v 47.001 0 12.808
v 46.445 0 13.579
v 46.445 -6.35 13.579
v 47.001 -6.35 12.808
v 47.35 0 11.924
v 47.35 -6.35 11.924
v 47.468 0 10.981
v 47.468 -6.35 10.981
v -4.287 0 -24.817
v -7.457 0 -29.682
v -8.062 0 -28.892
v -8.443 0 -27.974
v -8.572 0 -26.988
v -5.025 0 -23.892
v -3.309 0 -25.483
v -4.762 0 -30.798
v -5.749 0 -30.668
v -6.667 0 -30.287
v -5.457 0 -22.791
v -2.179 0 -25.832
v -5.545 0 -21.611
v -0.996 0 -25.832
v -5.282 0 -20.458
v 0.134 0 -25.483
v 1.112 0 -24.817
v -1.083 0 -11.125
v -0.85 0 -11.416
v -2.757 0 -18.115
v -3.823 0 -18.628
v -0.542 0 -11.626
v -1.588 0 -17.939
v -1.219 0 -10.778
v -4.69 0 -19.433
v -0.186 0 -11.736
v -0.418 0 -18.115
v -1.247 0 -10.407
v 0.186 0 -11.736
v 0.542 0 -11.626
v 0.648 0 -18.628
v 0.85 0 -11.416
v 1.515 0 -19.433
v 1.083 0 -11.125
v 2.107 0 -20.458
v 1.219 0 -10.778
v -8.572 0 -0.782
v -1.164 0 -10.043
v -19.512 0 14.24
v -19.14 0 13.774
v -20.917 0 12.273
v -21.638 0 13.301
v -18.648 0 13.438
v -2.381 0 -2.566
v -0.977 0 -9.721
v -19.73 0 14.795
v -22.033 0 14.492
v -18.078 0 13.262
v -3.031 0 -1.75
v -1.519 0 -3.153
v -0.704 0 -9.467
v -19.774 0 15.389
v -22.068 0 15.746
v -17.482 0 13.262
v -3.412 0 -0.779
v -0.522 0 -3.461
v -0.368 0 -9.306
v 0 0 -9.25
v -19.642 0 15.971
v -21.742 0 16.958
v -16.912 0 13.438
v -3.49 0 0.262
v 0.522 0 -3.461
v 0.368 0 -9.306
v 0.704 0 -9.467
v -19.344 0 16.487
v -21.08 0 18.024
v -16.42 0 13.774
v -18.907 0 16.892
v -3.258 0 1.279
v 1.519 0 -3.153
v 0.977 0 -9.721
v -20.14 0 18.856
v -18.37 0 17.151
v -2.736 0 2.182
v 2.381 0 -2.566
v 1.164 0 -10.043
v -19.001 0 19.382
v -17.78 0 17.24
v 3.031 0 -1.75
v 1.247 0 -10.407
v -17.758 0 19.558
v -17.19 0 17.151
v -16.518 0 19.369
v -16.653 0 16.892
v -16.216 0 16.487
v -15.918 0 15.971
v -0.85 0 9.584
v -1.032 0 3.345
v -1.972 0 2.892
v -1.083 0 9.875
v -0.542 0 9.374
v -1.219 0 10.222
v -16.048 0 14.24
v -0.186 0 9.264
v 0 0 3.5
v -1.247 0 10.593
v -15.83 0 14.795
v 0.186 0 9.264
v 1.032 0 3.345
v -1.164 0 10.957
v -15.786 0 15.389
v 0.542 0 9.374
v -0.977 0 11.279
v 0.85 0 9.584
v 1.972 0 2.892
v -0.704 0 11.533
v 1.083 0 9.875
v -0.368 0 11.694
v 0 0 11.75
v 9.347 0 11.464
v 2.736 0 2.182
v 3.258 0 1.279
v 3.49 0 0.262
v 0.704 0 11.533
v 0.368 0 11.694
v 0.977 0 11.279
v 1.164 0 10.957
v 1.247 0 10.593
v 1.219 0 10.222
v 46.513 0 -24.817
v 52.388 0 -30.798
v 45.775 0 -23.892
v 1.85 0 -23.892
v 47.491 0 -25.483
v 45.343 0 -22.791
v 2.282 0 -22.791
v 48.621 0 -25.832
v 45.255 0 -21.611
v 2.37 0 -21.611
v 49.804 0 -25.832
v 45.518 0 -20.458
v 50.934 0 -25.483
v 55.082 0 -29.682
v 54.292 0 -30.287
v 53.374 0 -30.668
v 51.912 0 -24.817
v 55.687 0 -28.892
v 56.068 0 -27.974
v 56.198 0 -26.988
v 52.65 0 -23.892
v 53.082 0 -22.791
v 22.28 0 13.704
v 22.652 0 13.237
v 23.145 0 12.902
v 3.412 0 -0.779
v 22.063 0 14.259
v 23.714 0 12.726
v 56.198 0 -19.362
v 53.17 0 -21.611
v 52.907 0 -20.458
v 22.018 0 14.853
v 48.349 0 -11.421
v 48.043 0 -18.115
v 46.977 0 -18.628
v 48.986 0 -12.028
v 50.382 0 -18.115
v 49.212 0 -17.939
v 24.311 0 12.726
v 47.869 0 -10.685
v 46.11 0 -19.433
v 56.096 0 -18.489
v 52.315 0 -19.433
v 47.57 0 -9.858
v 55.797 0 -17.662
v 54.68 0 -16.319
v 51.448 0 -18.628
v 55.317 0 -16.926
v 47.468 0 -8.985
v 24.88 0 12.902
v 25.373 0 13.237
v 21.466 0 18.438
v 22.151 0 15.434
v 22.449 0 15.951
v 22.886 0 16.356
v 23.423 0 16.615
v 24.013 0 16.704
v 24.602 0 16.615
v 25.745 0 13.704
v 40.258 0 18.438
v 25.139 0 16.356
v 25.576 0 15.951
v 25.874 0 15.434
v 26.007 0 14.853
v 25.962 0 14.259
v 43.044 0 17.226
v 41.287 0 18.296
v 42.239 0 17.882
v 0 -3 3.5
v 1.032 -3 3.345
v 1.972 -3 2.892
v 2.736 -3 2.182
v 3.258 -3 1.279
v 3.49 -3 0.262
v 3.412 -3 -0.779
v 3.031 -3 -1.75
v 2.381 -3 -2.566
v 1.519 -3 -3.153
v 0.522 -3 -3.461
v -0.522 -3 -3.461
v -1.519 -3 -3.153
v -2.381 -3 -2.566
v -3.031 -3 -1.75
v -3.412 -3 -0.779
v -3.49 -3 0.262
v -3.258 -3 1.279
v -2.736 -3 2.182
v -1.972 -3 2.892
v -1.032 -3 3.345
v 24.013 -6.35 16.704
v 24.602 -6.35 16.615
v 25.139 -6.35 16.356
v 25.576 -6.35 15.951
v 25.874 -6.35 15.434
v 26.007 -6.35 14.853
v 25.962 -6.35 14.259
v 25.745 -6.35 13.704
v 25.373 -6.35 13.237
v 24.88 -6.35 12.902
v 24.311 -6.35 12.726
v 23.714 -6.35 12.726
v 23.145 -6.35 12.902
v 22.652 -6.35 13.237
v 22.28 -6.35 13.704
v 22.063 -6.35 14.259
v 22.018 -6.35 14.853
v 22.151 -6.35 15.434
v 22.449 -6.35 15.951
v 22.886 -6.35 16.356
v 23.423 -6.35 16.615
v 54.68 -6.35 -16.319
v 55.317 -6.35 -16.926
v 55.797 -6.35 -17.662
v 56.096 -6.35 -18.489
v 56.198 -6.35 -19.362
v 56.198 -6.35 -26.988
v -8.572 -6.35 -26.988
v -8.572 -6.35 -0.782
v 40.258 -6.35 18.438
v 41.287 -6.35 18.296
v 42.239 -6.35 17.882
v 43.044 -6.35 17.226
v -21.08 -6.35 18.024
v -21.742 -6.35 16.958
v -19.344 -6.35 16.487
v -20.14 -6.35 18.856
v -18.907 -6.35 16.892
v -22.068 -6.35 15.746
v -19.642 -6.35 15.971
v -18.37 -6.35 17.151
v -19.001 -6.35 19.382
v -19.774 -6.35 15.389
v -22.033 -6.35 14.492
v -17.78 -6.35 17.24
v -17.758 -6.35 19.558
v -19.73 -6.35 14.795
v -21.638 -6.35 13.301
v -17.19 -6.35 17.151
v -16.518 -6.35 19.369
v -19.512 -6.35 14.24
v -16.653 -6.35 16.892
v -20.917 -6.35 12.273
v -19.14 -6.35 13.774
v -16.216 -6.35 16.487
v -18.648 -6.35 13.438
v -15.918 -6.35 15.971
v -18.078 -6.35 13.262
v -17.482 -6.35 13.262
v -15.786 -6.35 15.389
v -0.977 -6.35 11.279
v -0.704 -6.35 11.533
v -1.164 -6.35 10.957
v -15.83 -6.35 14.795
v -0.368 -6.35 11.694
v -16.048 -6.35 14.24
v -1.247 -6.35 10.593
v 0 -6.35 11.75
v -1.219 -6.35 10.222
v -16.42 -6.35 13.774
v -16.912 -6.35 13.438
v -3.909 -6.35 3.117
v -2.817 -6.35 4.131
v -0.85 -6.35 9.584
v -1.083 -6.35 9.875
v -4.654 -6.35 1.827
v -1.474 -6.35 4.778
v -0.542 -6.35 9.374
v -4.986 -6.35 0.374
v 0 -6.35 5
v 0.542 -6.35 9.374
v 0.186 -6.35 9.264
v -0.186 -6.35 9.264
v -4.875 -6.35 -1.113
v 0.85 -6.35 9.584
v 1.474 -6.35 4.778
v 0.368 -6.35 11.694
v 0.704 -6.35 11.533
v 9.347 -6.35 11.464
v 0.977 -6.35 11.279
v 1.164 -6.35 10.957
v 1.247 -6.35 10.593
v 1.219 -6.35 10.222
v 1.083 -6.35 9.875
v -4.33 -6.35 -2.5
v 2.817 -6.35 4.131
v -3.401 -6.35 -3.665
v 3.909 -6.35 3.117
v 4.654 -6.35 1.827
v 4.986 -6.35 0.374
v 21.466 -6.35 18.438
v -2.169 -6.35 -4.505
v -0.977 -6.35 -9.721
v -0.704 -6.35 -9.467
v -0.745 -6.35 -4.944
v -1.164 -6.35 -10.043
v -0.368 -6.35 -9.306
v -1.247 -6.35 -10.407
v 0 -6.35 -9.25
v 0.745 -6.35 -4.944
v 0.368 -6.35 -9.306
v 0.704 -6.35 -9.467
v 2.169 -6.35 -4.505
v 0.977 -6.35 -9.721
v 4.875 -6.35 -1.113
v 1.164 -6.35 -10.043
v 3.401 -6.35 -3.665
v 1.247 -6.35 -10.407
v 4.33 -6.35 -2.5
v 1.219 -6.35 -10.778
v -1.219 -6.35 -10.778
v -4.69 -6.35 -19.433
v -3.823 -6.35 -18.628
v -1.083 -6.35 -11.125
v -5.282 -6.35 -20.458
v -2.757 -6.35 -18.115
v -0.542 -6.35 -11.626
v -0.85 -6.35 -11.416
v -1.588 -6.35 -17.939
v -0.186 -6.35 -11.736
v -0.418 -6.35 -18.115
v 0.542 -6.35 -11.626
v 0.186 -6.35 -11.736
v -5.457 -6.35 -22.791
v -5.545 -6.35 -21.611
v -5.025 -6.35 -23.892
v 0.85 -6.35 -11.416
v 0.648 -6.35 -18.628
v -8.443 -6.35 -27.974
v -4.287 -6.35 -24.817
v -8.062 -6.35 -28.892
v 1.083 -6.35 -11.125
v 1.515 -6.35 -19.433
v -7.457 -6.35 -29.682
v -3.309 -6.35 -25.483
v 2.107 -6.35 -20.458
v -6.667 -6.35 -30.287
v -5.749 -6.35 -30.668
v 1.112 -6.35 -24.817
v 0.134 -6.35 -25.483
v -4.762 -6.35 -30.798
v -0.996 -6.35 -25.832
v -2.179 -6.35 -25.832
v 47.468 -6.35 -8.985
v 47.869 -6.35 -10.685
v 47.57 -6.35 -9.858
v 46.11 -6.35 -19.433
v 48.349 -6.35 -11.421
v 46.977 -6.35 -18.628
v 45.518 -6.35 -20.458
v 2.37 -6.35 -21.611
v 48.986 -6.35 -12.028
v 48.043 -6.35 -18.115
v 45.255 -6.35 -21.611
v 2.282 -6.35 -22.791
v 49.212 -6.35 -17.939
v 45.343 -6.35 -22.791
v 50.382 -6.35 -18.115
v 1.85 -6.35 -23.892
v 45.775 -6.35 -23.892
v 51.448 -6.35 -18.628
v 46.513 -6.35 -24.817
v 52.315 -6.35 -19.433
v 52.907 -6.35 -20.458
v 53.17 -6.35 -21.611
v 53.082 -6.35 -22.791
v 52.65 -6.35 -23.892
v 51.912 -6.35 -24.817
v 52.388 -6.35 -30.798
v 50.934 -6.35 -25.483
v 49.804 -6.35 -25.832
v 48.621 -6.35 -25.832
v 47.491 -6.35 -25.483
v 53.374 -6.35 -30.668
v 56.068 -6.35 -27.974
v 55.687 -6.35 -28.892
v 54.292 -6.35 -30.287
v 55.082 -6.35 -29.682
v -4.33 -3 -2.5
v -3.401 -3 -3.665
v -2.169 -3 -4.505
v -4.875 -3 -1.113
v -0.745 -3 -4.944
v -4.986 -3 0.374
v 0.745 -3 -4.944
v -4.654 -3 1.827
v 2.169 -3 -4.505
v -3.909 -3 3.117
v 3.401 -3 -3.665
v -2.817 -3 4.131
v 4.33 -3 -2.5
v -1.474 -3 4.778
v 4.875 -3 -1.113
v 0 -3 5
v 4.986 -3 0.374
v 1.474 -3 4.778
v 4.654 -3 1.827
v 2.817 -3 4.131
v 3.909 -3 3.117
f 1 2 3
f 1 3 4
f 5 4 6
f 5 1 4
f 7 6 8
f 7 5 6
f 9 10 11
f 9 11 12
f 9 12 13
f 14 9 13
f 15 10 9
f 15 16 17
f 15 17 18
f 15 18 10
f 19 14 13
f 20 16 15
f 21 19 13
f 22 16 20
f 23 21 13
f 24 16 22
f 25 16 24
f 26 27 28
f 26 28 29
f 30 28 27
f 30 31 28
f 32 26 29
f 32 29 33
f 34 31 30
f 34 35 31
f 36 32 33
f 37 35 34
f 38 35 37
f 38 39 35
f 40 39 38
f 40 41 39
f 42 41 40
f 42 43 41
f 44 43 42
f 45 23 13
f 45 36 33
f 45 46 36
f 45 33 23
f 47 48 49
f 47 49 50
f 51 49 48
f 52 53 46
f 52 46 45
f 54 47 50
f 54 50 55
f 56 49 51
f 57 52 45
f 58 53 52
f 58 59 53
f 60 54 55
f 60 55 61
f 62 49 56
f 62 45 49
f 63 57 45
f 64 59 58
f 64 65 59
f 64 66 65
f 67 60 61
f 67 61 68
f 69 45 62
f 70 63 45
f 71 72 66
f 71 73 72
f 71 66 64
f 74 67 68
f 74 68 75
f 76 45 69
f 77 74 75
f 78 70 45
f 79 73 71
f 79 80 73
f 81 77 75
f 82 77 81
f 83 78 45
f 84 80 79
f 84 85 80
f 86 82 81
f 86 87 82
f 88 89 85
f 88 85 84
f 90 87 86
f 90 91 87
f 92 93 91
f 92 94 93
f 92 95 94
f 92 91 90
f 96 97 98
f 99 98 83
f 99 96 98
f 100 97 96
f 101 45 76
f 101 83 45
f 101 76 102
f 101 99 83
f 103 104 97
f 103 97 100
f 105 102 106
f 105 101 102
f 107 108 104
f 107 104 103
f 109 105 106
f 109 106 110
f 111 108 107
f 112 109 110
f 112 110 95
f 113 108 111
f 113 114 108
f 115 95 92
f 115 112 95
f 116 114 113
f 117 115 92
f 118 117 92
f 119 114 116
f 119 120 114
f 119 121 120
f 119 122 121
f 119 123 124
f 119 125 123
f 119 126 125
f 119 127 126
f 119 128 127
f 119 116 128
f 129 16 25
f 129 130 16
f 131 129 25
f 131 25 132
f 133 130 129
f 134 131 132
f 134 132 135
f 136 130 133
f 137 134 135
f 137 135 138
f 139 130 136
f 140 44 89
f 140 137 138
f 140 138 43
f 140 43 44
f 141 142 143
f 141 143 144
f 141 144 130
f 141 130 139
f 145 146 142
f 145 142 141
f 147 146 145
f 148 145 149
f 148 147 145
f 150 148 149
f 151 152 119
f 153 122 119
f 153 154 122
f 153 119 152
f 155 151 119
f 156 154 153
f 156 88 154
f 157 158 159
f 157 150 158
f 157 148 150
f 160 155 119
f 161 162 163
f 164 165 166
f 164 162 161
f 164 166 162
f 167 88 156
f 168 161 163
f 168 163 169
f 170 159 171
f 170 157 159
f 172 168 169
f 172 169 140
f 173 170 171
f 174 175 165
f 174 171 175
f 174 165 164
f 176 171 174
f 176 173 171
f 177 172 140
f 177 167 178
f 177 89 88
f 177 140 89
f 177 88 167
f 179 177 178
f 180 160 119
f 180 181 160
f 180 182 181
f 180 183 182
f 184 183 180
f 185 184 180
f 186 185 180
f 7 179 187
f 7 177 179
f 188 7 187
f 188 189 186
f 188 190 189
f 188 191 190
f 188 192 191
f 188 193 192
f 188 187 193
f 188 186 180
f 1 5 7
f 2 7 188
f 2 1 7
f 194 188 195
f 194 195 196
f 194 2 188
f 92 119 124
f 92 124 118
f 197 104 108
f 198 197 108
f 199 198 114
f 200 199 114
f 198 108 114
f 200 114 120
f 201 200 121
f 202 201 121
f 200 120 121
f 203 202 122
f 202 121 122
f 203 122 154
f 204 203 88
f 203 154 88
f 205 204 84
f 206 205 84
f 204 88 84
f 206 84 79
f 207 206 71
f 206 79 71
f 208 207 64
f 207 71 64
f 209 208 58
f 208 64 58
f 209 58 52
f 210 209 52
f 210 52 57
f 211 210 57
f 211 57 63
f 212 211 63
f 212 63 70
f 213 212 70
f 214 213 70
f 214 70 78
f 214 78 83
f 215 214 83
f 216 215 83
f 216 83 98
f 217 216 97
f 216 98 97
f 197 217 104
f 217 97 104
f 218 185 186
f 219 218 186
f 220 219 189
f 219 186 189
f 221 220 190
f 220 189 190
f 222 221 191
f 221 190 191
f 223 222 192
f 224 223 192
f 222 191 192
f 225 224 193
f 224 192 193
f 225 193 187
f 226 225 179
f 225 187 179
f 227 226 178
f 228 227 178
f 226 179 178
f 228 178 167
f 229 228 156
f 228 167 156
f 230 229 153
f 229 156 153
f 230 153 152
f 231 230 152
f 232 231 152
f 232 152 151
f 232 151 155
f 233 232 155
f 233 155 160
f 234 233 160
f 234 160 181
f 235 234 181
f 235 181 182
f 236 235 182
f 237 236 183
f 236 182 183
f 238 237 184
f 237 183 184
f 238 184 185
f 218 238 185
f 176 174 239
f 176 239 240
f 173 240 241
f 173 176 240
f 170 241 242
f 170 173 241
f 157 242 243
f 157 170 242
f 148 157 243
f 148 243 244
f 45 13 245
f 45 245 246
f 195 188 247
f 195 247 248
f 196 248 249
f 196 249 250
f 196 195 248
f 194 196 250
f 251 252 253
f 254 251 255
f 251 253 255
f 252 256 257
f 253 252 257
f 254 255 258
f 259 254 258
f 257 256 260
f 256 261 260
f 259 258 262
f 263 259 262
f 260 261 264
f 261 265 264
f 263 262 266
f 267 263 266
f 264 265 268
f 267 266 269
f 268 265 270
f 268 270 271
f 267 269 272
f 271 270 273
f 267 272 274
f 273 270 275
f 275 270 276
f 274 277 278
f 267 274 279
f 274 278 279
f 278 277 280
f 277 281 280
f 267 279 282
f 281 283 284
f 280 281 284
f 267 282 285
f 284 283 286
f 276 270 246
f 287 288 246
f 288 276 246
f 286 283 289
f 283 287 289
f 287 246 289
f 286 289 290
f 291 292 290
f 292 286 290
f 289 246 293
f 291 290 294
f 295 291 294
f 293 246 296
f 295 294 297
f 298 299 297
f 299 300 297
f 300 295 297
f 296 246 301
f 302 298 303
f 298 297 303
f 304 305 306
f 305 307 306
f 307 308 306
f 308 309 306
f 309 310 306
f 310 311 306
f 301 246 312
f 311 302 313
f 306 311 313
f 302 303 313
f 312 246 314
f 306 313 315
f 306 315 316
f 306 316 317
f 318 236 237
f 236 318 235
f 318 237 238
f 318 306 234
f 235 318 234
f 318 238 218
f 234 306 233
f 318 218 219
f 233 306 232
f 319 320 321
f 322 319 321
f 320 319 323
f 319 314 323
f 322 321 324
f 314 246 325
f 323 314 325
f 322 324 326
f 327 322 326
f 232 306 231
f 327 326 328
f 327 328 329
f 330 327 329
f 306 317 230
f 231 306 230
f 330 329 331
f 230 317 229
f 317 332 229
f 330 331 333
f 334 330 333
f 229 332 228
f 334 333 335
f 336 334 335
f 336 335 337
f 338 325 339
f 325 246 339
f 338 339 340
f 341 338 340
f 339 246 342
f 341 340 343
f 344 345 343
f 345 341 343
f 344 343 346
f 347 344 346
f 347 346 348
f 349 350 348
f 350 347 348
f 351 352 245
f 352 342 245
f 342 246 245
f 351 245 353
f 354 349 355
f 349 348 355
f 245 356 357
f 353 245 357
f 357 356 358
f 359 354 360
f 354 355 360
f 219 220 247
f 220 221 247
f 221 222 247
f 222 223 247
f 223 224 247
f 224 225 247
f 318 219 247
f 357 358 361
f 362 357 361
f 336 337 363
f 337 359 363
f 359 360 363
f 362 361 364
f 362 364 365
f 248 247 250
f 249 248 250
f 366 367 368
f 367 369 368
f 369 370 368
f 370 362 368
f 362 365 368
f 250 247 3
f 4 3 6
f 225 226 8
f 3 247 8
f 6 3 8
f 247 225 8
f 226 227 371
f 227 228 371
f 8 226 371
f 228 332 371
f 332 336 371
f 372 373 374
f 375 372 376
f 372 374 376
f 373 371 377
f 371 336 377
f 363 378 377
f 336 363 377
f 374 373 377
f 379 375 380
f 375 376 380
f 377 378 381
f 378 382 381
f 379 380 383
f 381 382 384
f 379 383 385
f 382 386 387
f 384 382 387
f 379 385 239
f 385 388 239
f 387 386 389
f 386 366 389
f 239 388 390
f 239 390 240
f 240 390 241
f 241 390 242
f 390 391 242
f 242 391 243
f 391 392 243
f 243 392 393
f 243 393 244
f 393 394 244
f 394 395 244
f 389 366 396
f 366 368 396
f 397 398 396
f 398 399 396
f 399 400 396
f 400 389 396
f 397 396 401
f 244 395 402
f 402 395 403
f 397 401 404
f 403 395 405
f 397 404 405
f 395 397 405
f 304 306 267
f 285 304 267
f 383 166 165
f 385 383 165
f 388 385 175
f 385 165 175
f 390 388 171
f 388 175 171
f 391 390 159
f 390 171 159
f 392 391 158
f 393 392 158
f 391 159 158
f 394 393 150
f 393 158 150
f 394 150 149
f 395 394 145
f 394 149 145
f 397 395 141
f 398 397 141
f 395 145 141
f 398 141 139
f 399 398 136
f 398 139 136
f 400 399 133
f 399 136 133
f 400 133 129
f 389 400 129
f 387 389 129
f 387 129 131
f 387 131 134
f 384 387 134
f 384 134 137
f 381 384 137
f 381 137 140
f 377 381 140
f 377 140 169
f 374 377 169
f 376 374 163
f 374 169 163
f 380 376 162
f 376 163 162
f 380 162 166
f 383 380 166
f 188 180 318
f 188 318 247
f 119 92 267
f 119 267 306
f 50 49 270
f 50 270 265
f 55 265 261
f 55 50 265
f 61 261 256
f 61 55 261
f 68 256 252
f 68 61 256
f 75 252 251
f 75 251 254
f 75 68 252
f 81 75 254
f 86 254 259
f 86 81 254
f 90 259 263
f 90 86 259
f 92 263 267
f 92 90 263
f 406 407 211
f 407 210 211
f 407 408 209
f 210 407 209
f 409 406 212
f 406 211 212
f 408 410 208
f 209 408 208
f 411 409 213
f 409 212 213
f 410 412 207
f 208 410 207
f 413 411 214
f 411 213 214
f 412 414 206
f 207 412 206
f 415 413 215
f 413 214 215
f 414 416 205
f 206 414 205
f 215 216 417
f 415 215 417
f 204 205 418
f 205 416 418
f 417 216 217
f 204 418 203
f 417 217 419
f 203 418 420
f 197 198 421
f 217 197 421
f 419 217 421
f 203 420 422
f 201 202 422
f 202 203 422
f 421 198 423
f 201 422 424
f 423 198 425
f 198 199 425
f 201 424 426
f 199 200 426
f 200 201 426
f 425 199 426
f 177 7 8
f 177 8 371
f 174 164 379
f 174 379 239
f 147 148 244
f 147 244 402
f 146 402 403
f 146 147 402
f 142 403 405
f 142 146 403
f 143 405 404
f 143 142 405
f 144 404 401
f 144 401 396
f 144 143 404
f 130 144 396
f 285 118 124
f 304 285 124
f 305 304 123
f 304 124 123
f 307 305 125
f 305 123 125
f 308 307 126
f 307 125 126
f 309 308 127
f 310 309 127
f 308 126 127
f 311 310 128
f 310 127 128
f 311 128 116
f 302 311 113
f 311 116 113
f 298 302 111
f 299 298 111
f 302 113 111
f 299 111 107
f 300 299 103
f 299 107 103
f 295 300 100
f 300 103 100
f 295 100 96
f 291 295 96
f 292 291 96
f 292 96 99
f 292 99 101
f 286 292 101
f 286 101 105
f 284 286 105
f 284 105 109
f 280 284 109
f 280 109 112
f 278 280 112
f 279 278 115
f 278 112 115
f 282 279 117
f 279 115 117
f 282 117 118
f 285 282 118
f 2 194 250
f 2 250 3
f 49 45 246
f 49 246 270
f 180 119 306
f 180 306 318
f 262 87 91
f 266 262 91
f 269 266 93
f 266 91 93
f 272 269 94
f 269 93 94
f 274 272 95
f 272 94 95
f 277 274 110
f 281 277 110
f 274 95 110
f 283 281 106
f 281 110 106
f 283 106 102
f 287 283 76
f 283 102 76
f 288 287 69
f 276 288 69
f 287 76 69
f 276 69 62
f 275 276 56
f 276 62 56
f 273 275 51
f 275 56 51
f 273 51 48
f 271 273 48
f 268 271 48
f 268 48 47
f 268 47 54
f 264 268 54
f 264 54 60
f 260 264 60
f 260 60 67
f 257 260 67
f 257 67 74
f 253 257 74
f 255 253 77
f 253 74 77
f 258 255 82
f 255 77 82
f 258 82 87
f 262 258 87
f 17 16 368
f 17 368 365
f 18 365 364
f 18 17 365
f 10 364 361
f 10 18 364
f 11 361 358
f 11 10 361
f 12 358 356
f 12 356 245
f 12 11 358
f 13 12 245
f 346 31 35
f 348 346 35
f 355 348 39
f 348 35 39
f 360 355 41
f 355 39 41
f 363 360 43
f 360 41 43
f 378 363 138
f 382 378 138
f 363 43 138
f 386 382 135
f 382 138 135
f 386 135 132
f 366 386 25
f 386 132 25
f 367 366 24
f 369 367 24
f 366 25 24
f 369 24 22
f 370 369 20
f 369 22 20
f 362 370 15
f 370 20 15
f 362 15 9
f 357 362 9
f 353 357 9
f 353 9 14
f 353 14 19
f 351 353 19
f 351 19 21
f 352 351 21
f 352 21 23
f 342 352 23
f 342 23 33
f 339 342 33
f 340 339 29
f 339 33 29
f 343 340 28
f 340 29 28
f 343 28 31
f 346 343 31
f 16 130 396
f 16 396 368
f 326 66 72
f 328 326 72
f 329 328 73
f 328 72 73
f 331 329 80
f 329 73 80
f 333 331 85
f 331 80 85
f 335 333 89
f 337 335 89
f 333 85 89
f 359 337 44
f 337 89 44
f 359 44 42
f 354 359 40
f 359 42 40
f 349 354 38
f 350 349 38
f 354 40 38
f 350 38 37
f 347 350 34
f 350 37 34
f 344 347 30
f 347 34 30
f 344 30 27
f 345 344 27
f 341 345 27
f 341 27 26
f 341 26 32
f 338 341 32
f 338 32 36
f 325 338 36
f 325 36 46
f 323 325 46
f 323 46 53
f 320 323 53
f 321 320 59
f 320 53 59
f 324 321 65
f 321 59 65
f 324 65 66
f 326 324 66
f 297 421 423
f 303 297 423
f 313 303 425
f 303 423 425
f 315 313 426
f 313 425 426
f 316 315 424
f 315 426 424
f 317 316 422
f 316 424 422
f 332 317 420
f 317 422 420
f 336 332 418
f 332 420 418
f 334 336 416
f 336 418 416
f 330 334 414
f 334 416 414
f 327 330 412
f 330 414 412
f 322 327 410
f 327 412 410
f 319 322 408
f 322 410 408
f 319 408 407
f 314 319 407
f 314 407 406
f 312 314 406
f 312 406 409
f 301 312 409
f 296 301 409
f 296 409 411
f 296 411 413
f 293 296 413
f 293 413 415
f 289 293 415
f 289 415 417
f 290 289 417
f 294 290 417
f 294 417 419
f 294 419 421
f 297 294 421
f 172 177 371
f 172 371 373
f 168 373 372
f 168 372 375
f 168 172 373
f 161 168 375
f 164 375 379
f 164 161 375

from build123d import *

# Parameters (mm, degrees)
SKETCH4_R           = 2
SKETCH4_R_2         = 1.25
SKETCH4_R_3         = 5
SKETCH4_R_4         = 3.96875
BOSS_EXTRUDE2_DEPTH = 6.35
SKETCH33_R          = 5
SKETCH33_R_2        = 3.499999985
BOSS_EXTRUDE6_DEPTH = 3


with BuildPart() as part:
    # Sketch4 → Boss-Extrude2 (new body)
    # profile 1 of 2: a face of its own
    with BuildSketch(Plane(origin=(0, 0, 0), x_dir=(1, 0, 0), z_dir=(0, 1, 0))):
        with BuildLine():
            Line((21.46596982, -18.4375), (40.257702493, -18.4375))
            ThreePointArc((40.257702493, -18.4375), (41.776936446, -18.121498883), (43.044160097, -17.225913752))
            Line((43.044160097, -17.225913752), (46.444939319, -13.579024524))
            ThreePointArc((46.444939319, -13.579024524), (47.203372649, -12.376980446), (47.468481715, -10.980610773))
            Line((47.468481715, -10.980610773), (47.468481715, 8.985116992))
            ThreePointArc((47.468481715, 8.985116992), (47.868781798, 10.685130659), (48.985566477, 12.027918285))
            Line((48.985566477, 12.027918285), (54.680415238, 16.319294633))
            ThreePointArc((54.680415238, 16.319294633), (55.797199918, 17.662082259), (56.1975, 19.362095927))
            Line((56.1975, 19.362095927), (56.1975, 26.9875))
            ThreePointArc((56.1975, 26.9875), (55.081576836, 29.681576836), (52.3875, 30.7975))
            Line((52.3875, 30.7975), (-4.7625, 30.7975))
            ThreePointArc((-4.7625, 30.7975), (-7.456576836, 29.681576836), (-8.5725, 26.9875))
            Line((-8.5725, 26.9875), (-8.5725, 0.781747009))
            Line((-8.5725, 0.781747009), (-20.917416467, -12.27322702))
            ThreePointArc((-20.917416467, -12.27322702), (-21.4498857, -17.515316011), (-16.517810325, -19.369406885))
            Line((-16.517810325, -19.369406885), (9.346561417, -11.463733294))
            Line((9.346561417, -11.463733294), (21.46596982, -18.4375))
        make_face()
        with Locations(Location((-17.78, -15.24, 0), (0, 0, 270))):
            Circle(SKETCH4_R, mode=Mode.SUBTRACT)
        with Locations(Location((0, -10.5, 0), (0, 0, 270))):
            Circle(SKETCH4_R_2, mode=Mode.SUBTRACT)
        with Locations(Location((0, 0, 0), (0, 0, 270))):
            Circle(SKETCH4_R_3, mode=Mode.SUBTRACT)
        with Locations(Location((24.012521227, -14.703599027, 0), (0, 0, 270))):
            Circle(SKETCH4_R, mode=Mode.SUBTRACT)
        with Locations(Location((0, 10.5, 0), (0, 0, 270))):
            Circle(SKETCH4_R_2, mode=Mode.SUBTRACT)
        with Locations(Location((-1.5875, 21.9075, 0), (0, 0, 270))):
            Circle(SKETCH4_R_4, mode=Mode.SUBTRACT)
        with Locations(Location((49.2125, 21.9075, 0), (0, 0, 270))):
            Circle(SKETCH4_R_4, mode=Mode.SUBTRACT)
    # profile 2 of 2: a face of its own
    with BuildSketch(Plane(origin=(0, 0, 0), x_dir=(1, 0, 0), z_dir=(0, 1, 0))):
        with BuildLine():
            Line((21.46596982, -18.4375), (40.257702493, -18.4375))
            ThreePointArc((40.257702493, -18.4375), (41.776936446, -18.121498883), (43.044160097, -17.225913752))
            Line((43.044160097, -17.225913752), (46.444939319, -13.579024524))
            ThreePointArc((46.444939319, -13.579024524), (47.203372649, -12.376980446), (47.468481715, -10.980610773))
            Line((47.468481715, -10.980610773), (47.468481715, 8.985116992))
            ThreePointArc((47.468481715, 8.985116992), (47.868781798, 10.685130659), (48.985566477, 12.027918285))
            Line((48.985566477, 12.027918285), (54.680415238, 16.319294633))
            ThreePointArc((54.680415238, 16.319294633), (55.797199918, 17.662082259), (56.1975, 19.362095927))
            Line((56.1975, 19.362095927), (56.1975, 26.9875))
            ThreePointArc((56.1975, 26.9875), (55.081576836, 29.681576836), (52.3875, 30.7975))
            Line((52.3875, 30.7975), (-4.7625, 30.7975))
            ThreePointArc((-4.7625, 30.7975), (-7.456576836, 29.681576836), (-8.5725, 26.9875))
            Line((-8.5725, 26.9875), (-8.5725, 0.781747009))
            Line((-8.5725, 0.781747009), (-20.917416467, -12.27322702))
            ThreePointArc((-20.917416467, -12.27322702), (-21.4498857, -17.515316011), (-16.517810325, -19.369406885))
            Line((-16.517810325, -19.369406885), (9.346561417, -11.463733294))
            Line((9.346561417, -11.463733294), (21.46596982, -18.4375))
        make_face()
        with Locations(Location((-17.78, -15.24, 0), (0, 0, 270))):
            Circle(SKETCH4_R, mode=Mode.SUBTRACT)
        with Locations(Location((0, -10.5, 0), (0, 0, 270))):
            Circle(SKETCH4_R_2, mode=Mode.SUBTRACT)
        with Locations(Location((0, 0, 0), (0, 0, 270))):
            Circle(SKETCH4_R_3, mode=Mode.SUBTRACT)
        with Locations(Location((24.012521227, -14.703599027, 0), (0, 0, 270))):
            Circle(SKETCH4_R, mode=Mode.SUBTRACT)
        with Locations(Location((0, 10.5, 0), (0, 0, 270))):
            Circle(SKETCH4_R_2, mode=Mode.SUBTRACT)
        with Locations(Location((-1.5875, 21.9075, 0), (0, 0, 270))):
            Circle(SKETCH4_R_4, mode=Mode.SUBTRACT)
        with Locations(Location((49.2125, 21.9075, 0), (0, 0, 270))):
            Circle(SKETCH4_R_4, mode=Mode.SUBTRACT)
    extrude(amount=-BOSS_EXTRUDE2_DEPTH)

    # Sketch33 → Boss-Extrude6 (add)
    with BuildSketch(Plane(origin=(0, 0, 0), x_dir=(1, 0, 0), z_dir=(0, 1, 0))):
        with Locations(Location((0, 0, 0), (0, 0, 270))):
            Circle(SKETCH33_R)
        with Locations(Location((0, 0, 0), (0, 0, 270))):
            Circle(SKETCH33_R_2, mode=Mode.SUBTRACT)
    extrude(amount=-BOSS_EXTRUDE6_DEPTH)


solid = part.part
